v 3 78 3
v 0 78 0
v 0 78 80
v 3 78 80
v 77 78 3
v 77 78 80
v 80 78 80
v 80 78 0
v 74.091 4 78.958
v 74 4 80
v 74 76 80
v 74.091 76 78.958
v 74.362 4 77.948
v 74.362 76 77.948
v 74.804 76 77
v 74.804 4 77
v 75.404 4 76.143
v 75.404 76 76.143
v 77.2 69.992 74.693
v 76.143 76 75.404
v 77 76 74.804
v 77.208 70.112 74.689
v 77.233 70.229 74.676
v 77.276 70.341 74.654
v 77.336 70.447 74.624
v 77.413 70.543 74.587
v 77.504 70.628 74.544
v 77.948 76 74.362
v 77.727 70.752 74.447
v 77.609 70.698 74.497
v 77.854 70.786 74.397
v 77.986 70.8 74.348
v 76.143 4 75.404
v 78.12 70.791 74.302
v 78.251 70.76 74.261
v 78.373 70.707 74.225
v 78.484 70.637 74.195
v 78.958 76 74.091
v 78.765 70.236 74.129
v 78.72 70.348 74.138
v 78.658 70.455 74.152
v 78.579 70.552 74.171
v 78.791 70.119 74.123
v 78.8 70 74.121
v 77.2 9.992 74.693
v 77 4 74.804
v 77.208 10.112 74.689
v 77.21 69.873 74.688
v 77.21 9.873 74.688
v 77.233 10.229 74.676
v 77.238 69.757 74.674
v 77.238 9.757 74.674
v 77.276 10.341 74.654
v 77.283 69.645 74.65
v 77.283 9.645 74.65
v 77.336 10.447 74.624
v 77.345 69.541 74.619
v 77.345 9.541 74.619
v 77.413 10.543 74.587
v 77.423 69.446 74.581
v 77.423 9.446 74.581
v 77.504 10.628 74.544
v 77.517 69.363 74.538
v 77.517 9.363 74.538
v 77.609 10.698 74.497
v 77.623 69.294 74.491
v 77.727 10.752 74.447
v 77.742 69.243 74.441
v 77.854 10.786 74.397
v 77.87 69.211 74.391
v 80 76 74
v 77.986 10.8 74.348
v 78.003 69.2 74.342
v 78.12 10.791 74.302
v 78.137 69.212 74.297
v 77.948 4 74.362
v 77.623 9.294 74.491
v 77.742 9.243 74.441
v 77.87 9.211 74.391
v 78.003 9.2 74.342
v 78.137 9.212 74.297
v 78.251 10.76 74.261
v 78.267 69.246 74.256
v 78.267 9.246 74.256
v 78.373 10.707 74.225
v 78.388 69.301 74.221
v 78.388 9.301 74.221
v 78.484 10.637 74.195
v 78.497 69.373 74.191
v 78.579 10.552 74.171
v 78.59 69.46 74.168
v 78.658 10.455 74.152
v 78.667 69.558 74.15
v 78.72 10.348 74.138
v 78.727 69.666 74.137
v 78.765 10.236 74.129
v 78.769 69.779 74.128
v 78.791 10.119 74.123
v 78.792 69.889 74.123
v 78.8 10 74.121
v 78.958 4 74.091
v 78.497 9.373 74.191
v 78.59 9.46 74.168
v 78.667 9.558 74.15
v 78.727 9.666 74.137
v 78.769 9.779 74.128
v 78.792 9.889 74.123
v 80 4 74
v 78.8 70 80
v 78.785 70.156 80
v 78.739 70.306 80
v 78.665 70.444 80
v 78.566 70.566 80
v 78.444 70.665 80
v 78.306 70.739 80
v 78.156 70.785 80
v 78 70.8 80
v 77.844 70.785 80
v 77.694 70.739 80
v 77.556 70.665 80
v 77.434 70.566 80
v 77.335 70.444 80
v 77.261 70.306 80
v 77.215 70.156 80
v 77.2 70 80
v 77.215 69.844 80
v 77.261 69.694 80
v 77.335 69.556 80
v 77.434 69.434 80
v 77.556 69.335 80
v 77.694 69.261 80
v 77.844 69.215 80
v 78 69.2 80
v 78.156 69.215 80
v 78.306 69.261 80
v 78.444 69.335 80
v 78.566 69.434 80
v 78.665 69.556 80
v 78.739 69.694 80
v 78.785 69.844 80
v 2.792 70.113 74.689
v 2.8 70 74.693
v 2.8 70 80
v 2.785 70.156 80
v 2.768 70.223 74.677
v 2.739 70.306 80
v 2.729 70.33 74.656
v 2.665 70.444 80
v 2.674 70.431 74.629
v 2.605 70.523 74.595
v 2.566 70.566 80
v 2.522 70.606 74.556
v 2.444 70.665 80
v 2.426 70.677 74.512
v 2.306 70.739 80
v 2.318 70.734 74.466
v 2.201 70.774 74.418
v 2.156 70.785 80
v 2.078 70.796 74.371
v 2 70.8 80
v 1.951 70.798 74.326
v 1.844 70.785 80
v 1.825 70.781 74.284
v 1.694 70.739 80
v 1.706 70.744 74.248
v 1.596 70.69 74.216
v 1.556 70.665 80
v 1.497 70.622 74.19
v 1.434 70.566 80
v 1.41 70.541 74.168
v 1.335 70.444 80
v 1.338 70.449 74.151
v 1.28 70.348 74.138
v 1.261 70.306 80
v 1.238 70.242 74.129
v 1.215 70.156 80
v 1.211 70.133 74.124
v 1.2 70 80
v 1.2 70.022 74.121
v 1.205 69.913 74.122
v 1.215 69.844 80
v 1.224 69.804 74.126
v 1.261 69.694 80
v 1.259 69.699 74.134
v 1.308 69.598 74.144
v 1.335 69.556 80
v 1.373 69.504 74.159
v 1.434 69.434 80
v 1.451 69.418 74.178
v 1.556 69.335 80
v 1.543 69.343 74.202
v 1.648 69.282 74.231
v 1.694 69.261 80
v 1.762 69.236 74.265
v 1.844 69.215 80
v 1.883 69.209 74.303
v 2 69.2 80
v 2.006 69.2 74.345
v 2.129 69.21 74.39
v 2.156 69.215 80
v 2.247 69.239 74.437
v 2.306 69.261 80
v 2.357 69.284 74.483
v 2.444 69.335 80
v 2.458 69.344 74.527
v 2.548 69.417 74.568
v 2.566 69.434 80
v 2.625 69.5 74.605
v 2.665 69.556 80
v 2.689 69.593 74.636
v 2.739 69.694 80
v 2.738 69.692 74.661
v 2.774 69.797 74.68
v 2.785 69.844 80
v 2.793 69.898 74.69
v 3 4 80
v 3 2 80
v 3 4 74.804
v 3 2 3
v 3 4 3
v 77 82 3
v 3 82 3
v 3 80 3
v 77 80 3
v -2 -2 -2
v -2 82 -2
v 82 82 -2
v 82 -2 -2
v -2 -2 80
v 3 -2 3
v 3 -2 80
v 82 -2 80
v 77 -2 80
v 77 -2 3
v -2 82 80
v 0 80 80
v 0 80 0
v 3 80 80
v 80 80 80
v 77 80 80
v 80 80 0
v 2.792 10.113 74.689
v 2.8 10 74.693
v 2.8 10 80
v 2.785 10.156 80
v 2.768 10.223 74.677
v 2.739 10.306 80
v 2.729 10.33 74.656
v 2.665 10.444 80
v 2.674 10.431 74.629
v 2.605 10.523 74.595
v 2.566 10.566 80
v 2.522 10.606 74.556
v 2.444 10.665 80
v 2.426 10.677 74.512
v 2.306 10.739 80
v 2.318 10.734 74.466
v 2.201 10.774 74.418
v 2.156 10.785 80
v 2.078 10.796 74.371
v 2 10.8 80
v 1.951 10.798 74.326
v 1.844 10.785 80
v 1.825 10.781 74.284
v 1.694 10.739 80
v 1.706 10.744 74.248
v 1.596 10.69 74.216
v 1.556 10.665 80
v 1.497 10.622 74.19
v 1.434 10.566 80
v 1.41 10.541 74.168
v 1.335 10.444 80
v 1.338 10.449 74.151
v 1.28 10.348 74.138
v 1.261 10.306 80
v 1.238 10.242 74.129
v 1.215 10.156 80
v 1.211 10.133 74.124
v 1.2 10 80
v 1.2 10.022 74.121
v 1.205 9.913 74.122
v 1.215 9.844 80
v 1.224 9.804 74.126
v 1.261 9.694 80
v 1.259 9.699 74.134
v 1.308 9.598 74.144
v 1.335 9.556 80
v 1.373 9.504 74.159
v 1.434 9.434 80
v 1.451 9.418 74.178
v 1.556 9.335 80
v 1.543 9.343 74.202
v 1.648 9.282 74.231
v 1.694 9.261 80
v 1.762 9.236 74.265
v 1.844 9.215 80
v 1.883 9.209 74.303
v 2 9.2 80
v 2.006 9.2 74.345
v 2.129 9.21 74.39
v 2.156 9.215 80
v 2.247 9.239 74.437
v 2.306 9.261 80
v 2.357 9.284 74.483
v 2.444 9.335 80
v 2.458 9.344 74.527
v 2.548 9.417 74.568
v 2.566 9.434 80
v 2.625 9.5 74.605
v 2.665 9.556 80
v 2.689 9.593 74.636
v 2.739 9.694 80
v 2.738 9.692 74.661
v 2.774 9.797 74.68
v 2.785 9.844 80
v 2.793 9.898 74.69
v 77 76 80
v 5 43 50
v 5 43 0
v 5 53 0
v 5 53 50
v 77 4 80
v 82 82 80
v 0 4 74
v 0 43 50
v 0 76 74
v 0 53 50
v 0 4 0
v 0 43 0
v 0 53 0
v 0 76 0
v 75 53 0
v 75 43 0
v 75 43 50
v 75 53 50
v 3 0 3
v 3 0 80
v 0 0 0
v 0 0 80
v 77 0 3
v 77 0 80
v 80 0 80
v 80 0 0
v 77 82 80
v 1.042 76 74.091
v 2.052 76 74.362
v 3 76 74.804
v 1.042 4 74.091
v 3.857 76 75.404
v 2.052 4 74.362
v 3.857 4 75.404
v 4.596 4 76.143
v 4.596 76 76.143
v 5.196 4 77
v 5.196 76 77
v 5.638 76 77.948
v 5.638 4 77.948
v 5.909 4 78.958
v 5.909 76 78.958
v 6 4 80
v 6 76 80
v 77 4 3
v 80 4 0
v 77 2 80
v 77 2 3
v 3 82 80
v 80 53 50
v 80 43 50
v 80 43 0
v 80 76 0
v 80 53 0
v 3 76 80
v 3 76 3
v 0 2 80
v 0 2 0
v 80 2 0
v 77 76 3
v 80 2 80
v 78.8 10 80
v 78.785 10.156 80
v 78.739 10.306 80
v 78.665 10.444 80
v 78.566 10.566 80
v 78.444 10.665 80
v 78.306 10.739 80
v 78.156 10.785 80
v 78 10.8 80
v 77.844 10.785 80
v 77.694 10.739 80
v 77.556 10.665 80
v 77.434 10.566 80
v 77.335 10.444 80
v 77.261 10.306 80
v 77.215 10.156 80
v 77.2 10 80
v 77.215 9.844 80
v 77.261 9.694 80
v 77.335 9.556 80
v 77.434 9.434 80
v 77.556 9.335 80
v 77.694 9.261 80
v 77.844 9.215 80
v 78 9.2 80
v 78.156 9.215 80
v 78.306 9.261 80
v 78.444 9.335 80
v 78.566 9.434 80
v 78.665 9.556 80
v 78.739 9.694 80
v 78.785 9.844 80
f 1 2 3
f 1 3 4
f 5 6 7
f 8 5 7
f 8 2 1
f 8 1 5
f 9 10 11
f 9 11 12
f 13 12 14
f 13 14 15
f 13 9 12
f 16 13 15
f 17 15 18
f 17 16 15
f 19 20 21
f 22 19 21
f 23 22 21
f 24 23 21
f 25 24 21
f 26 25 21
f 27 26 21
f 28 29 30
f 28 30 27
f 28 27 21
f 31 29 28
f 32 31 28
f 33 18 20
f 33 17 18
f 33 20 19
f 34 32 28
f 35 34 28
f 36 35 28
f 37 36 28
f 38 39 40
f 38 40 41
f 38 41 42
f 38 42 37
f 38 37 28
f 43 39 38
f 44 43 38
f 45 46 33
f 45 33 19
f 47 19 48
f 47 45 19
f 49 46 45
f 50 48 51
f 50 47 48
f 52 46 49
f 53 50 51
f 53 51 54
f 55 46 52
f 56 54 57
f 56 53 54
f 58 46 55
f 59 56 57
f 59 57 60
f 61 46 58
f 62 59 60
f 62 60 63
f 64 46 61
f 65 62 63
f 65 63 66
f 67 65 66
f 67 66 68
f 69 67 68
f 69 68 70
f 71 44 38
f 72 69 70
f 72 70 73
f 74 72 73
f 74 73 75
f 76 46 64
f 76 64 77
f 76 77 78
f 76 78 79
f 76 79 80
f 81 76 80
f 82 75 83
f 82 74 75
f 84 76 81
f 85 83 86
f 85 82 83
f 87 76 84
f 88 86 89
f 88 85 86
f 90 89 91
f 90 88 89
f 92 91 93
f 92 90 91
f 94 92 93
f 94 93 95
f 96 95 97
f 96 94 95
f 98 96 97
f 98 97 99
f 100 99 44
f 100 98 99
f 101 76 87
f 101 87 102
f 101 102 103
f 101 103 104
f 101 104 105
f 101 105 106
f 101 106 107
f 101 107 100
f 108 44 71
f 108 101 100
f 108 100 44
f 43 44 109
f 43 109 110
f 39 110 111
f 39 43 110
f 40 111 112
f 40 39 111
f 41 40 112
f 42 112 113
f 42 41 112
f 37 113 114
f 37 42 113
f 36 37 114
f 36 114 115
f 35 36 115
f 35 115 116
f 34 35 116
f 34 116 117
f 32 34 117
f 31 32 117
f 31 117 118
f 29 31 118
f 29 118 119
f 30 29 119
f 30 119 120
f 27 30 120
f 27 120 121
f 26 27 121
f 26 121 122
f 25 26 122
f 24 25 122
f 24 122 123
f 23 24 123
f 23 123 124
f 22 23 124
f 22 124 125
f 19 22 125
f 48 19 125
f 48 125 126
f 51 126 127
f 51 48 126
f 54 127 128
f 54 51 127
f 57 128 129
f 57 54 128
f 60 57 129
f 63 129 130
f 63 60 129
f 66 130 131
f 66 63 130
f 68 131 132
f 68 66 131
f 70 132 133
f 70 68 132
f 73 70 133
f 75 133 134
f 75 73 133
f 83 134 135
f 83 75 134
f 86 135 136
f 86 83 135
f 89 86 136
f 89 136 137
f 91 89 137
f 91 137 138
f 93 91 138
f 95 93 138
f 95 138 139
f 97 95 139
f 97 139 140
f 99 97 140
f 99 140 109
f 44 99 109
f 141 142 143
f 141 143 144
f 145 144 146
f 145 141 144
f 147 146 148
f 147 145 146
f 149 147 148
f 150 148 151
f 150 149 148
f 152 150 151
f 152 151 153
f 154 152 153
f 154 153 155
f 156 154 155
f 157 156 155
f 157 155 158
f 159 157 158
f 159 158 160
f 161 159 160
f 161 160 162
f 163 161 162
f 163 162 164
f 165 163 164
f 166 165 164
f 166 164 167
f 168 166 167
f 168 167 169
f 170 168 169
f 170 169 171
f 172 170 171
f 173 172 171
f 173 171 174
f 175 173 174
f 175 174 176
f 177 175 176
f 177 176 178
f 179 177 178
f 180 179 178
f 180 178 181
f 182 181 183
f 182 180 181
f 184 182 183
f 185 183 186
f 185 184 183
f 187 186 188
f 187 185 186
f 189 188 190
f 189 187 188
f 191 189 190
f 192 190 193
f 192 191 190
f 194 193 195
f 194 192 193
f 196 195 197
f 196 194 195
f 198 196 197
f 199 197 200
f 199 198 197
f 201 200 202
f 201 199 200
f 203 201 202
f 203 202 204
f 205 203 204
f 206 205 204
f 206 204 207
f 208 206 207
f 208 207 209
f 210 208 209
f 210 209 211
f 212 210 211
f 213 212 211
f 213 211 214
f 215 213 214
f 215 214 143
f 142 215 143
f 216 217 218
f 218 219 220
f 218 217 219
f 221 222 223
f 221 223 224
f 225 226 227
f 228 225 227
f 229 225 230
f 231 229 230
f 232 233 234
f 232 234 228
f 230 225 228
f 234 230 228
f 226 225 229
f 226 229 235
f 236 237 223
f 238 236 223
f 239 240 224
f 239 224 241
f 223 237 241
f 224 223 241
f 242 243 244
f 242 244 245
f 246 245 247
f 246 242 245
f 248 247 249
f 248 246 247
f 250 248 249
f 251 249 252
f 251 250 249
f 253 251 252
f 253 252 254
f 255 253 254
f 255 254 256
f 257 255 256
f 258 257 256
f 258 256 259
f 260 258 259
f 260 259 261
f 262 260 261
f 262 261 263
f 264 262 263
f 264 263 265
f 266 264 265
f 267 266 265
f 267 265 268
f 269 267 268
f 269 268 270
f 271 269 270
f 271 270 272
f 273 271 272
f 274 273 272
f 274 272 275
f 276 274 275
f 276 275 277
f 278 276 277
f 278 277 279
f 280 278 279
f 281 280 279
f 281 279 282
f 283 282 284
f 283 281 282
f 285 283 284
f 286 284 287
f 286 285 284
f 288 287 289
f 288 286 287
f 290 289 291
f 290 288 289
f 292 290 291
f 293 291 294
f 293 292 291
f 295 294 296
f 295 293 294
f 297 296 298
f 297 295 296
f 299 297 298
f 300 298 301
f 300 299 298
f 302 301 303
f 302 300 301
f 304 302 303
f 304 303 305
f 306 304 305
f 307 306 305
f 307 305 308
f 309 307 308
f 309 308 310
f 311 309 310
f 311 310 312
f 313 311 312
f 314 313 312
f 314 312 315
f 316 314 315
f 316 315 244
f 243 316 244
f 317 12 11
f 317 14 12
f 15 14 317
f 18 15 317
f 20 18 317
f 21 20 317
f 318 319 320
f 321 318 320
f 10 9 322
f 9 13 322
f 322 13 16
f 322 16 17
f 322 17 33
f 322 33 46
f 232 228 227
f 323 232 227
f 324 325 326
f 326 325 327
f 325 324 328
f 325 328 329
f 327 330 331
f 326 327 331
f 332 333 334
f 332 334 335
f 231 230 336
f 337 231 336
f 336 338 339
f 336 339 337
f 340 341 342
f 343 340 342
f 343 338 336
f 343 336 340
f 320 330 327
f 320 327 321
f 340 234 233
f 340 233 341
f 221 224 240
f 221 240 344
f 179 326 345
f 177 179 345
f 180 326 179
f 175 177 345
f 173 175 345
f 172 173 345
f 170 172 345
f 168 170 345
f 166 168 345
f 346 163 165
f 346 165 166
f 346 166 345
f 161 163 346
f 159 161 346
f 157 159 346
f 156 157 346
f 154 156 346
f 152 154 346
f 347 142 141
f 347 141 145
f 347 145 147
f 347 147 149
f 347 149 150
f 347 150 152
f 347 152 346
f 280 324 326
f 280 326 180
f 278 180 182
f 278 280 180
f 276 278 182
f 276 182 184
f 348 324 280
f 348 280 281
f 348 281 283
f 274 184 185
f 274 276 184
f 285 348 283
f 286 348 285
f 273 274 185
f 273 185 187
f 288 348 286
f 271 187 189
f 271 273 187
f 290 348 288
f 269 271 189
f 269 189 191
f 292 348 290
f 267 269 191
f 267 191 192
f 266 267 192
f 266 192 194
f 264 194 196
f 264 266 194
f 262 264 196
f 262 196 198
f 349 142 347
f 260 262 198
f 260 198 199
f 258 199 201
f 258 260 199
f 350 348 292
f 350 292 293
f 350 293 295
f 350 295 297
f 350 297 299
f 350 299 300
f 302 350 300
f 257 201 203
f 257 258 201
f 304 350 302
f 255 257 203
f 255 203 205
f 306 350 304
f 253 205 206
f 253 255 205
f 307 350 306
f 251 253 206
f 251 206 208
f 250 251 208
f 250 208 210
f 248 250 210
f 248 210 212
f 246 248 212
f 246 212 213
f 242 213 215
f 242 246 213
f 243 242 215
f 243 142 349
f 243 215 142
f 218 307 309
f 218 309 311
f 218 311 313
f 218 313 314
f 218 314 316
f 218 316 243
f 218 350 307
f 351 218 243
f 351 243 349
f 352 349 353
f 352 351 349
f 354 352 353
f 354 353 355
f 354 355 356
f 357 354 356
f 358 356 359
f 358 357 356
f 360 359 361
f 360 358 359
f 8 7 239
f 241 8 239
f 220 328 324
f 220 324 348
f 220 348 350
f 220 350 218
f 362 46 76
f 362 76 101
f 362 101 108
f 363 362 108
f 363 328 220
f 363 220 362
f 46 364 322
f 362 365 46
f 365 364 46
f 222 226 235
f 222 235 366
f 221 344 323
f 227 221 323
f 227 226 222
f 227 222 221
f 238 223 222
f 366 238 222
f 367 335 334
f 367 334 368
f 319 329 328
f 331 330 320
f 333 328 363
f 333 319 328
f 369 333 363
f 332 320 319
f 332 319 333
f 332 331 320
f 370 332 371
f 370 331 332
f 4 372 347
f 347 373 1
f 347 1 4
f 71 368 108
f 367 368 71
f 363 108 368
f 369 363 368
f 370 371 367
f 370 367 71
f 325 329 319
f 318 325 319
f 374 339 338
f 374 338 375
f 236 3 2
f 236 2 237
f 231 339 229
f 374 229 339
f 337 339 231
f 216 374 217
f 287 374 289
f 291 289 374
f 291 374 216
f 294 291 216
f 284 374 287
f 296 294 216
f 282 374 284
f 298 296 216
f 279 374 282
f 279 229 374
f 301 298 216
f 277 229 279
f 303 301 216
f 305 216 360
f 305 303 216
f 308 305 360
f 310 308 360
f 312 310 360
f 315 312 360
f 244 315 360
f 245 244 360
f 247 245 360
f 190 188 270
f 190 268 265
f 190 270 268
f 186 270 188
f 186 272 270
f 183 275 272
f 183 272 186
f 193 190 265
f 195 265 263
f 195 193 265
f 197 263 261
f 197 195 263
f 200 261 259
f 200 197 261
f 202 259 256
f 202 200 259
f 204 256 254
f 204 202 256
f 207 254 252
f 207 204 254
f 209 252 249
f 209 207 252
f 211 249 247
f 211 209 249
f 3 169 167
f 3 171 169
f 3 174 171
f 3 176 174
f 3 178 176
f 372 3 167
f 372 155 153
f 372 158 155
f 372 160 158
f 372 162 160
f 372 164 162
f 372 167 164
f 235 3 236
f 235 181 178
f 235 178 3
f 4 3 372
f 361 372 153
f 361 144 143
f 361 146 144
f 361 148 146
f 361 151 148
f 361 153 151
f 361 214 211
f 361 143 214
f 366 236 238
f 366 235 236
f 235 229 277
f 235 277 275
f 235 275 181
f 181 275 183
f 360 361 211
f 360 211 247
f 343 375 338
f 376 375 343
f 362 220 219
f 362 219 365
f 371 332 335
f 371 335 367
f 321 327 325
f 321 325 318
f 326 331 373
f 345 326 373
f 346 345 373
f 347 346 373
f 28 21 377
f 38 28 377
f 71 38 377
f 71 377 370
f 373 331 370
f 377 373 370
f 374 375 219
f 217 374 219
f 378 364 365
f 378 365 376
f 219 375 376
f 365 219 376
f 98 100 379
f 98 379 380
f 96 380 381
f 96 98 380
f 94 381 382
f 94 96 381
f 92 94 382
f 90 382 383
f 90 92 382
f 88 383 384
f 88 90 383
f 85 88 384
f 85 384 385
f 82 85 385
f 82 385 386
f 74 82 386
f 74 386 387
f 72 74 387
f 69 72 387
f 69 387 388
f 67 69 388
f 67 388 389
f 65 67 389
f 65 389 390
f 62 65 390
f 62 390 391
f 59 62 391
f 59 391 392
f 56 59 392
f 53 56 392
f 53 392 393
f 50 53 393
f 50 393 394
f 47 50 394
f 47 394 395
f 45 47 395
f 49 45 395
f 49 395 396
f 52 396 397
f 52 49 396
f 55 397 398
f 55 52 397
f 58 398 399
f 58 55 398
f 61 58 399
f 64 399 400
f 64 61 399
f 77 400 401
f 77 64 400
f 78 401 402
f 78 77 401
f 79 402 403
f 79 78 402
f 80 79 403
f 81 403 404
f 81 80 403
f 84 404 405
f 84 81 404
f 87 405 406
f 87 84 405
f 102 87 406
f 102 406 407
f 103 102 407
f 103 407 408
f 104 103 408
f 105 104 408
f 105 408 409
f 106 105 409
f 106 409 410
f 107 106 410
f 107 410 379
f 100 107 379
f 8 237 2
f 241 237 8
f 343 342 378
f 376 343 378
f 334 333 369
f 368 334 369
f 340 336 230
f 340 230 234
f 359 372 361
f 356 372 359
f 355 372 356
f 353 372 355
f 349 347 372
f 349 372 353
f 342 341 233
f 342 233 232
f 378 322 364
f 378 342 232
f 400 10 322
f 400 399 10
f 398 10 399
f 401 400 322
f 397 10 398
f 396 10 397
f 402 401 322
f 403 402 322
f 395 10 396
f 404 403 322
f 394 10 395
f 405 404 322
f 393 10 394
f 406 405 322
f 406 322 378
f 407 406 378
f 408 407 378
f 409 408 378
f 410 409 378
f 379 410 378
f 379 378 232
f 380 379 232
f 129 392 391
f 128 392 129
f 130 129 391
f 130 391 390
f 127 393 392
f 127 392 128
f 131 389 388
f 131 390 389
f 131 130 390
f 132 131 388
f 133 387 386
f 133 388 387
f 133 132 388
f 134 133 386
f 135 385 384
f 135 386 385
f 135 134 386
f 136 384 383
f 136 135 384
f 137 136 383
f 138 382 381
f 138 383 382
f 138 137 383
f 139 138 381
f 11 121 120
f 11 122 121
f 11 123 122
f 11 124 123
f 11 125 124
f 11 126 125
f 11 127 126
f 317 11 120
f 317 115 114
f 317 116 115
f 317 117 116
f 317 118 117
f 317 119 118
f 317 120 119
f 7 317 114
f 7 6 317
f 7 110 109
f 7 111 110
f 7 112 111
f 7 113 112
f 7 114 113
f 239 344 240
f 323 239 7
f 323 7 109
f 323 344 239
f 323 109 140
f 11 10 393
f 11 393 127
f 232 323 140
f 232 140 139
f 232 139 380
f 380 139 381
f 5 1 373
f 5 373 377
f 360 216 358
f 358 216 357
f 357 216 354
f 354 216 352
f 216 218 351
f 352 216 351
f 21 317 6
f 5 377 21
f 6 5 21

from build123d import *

# Parameters (mm, degrees)
CYLINDER_R        = 0.8
CYLINDER_DEPTH    = 10
CYLINDER001_R     = 0.8
CYLINDER001_DEPTH = 10
CYLINDER002_R     = 0.8
CYLINDER002_DEPTH = 10
CYLINDER003_R     = 0.8
CYLINDER003_DEPTH = 10
BOX004_W          = 74
BOX004_H          = 9
BOX004_DEPTH      = 77
BOX002_W          = 74
BOX002_H          = 8
BOX002_DEPTH      = 77
BOX_W             = 80
BOX_H             = 80
BOX_DEPTH         = 80
THICKNESS_T       = 2
BOX003_W          = 80
BOX003_H          = 2
BOX003_DEPTH      = 80
CYLINDER004_W     = 6
CYLINDER004_H     = 74
CYLINDER004_ANGLE = 90
CYLINDER005_W     = 6
CYLINDER005_H     = 74
CYLINDER005_ANGLE = 90
BOX005_W          = 5
BOX005_H          = 10
BOX005_DEPTH      = 50
BOX006_W          = 5
BOX006_H          = 10
BOX006_DEPTH      = 50
BOX001_W          = 80
BOX001_H          = 2
BOX001_DEPTH      = 80


with BuildPart() as cylinder:
    # Cylinder → Cylinder (new body)
    with BuildSketch(Plane(origin=(2, 10, 70), x_dir=(1, 0, 0), z_dir=(0, 0, 1))):
        Circle(CYLINDER_R)
    extrude(amount=CYLINDER_DEPTH)


with BuildPart() as cylinder001:
    # Cylinder001 → Cylinder001 (new body)
    with BuildSketch(Plane(origin=(2, 70, 70), x_dir=(1, 0, 0), z_dir=(0, 0, 1))):
        Circle(CYLINDER001_R)
    extrude(amount=CYLINDER001_DEPTH)


with BuildPart() as cylinder002:
    # Cylinder002 → Cylinder002 (new body)
    with BuildSketch(Plane(origin=(78, 70, 70), x_dir=(1, 0, 0), z_dir=(0, 0, 1))):
        Circle(CYLINDER002_R)
    extrude(amount=CYLINDER002_DEPTH)


with BuildPart() as cylinder003:
    # Cylinder003 → Cylinder003 (new body)
    with BuildSketch(Plane(origin=(78, 10, 70), x_dir=(1, 0, 0), z_dir=(0, 0, 1))):
        Circle(CYLINDER003_R)
    extrude(amount=CYLINDER003_DEPTH)


with BuildPart() as cube004:
    # Box004 → Box004 (new body)
    with BuildSketch(Plane(origin=(3, 76, 3), x_dir=(1, 0, 0), z_dir=(0, 0, 1))):
        with Locations((37, 4.5)):
            Rectangle(BOX004_W, BOX004_H)
    extrude(amount=BOX004_DEPTH)


with BuildPart() as fusion001:
    # Box002 → Box002 (new body)
    with BuildSketch(Plane(origin=(3, -4, 3), x_dir=(1, 0, 0), z_dir=(0, 0, 1))):
        with Locations((37, 4)):
            Rectangle(BOX002_W, BOX002_H)
    extrude(amount=BOX002_DEPTH)

    # Fusion001: union Cylinder, Cylinder001, Cylinder002, Cylinder003, Cube004
    add(cylinder.part)
    add(cylinder001.part)
    add(cylinder002.part)
    add(cylinder003.part)
    add(cube004.part)


with BuildPart() as thickness:
    # Box → Box (new body)
    with BuildSketch(Plane.XY):
        with Locations((40, 40)):
            Rectangle(BOX_W, BOX_H)
    extrude(amount=BOX_DEPTH)

    # Thickness
    thickness_openings = [thickness.faces().sort_by_distance(p)[0] for p in [
        (40, 40, 80),
    ]]
    offset(amount=THICKNESS_T, openings=thickness_openings, kind=Kind.INTERSECTION)


with BuildPart() as cube003:
    # Box003 → Box003 (new body)
    with BuildSketch(Plane(origin=(0, 76, 0), x_dir=(1, 0, 0), z_dir=(0, 0, 1))):
        with Locations((40, 1)):
            Rectangle(BOX003_W, BOX003_H)
    extrude(amount=BOX003_DEPTH)


with BuildPart() as cylinder004:
    # Cylinder004 → Cylinder004 (revolve)
    with BuildSketch(Plane(origin=(0, 78, 80), x_dir=(0, 0, -1), z_dir=(-1, 0, 0))):
        with Locations((3, 37)):
            Rectangle(CYLINDER004_W, CYLINDER004_H)
    revolve(axis=Axis((0, 78, 80), (0, -1, 0)), revolution_arc=CYLINDER004_ANGLE)


with BuildPart() as cylinder005:
    # Cylinder005 → Cylinder005 (revolve)
    with BuildSketch(Plane(origin=(80, 78, 80), x_dir=(-1, 0, 0), z_dir=(0, 0, 1))):
        with Locations((3, 37)):
            Rectangle(CYLINDER005_W, CYLINDER005_H)
    revolve(axis=Axis((80, 78, 80), (0, -1, 0)), revolution_arc=CYLINDER005_ANGLE)


with BuildPart() as cube005:
    # Box005 → Box005 (new body)
    with BuildSketch(Plane(origin=(0, 43, 0), x_dir=(1, 0, 0), z_dir=(0, 0, 1))):
        with Locations((2.5, 5)):
            Rectangle(BOX005_W, BOX005_H)
    extrude(amount=BOX005_DEPTH)


with BuildPart() as cube006:
    # Box006 → Box006 (new body)
    with BuildSketch(Plane(origin=(75, 43, 0), x_dir=(1, 0, 0), z_dir=(0, 0, 1))):
        with Locations((2.5, 5)):
            Rectangle(BOX006_W, BOX006_H)
    extrude(amount=BOX006_DEPTH)


with BuildPart() as cut_obal:
    # Box001 → Box001 (new body)
    with BuildSketch(Plane(origin=(0, 2, 0), x_dir=(1, 0, 0), z_dir=(0, 0, 1))):
        with Locations((40, 1)):
            Rectangle(BOX001_W, BOX001_H)
    extrude(amount=BOX001_DEPTH)

    # Fusion: union Thickness, Cube003, Cylinder004, Cylinder005, Cube005, Cube006
    add(thickness.part)
    add(cube003.part)
    add(cylinder004.part)
    add(cylinder005.part)
    add(cube005.part)
    add(cube006.part)

    # Cut: cut Fusion001
    add(fusion001.part, mode=Mode.SUBTRACT)


solid = cut_obal.part
